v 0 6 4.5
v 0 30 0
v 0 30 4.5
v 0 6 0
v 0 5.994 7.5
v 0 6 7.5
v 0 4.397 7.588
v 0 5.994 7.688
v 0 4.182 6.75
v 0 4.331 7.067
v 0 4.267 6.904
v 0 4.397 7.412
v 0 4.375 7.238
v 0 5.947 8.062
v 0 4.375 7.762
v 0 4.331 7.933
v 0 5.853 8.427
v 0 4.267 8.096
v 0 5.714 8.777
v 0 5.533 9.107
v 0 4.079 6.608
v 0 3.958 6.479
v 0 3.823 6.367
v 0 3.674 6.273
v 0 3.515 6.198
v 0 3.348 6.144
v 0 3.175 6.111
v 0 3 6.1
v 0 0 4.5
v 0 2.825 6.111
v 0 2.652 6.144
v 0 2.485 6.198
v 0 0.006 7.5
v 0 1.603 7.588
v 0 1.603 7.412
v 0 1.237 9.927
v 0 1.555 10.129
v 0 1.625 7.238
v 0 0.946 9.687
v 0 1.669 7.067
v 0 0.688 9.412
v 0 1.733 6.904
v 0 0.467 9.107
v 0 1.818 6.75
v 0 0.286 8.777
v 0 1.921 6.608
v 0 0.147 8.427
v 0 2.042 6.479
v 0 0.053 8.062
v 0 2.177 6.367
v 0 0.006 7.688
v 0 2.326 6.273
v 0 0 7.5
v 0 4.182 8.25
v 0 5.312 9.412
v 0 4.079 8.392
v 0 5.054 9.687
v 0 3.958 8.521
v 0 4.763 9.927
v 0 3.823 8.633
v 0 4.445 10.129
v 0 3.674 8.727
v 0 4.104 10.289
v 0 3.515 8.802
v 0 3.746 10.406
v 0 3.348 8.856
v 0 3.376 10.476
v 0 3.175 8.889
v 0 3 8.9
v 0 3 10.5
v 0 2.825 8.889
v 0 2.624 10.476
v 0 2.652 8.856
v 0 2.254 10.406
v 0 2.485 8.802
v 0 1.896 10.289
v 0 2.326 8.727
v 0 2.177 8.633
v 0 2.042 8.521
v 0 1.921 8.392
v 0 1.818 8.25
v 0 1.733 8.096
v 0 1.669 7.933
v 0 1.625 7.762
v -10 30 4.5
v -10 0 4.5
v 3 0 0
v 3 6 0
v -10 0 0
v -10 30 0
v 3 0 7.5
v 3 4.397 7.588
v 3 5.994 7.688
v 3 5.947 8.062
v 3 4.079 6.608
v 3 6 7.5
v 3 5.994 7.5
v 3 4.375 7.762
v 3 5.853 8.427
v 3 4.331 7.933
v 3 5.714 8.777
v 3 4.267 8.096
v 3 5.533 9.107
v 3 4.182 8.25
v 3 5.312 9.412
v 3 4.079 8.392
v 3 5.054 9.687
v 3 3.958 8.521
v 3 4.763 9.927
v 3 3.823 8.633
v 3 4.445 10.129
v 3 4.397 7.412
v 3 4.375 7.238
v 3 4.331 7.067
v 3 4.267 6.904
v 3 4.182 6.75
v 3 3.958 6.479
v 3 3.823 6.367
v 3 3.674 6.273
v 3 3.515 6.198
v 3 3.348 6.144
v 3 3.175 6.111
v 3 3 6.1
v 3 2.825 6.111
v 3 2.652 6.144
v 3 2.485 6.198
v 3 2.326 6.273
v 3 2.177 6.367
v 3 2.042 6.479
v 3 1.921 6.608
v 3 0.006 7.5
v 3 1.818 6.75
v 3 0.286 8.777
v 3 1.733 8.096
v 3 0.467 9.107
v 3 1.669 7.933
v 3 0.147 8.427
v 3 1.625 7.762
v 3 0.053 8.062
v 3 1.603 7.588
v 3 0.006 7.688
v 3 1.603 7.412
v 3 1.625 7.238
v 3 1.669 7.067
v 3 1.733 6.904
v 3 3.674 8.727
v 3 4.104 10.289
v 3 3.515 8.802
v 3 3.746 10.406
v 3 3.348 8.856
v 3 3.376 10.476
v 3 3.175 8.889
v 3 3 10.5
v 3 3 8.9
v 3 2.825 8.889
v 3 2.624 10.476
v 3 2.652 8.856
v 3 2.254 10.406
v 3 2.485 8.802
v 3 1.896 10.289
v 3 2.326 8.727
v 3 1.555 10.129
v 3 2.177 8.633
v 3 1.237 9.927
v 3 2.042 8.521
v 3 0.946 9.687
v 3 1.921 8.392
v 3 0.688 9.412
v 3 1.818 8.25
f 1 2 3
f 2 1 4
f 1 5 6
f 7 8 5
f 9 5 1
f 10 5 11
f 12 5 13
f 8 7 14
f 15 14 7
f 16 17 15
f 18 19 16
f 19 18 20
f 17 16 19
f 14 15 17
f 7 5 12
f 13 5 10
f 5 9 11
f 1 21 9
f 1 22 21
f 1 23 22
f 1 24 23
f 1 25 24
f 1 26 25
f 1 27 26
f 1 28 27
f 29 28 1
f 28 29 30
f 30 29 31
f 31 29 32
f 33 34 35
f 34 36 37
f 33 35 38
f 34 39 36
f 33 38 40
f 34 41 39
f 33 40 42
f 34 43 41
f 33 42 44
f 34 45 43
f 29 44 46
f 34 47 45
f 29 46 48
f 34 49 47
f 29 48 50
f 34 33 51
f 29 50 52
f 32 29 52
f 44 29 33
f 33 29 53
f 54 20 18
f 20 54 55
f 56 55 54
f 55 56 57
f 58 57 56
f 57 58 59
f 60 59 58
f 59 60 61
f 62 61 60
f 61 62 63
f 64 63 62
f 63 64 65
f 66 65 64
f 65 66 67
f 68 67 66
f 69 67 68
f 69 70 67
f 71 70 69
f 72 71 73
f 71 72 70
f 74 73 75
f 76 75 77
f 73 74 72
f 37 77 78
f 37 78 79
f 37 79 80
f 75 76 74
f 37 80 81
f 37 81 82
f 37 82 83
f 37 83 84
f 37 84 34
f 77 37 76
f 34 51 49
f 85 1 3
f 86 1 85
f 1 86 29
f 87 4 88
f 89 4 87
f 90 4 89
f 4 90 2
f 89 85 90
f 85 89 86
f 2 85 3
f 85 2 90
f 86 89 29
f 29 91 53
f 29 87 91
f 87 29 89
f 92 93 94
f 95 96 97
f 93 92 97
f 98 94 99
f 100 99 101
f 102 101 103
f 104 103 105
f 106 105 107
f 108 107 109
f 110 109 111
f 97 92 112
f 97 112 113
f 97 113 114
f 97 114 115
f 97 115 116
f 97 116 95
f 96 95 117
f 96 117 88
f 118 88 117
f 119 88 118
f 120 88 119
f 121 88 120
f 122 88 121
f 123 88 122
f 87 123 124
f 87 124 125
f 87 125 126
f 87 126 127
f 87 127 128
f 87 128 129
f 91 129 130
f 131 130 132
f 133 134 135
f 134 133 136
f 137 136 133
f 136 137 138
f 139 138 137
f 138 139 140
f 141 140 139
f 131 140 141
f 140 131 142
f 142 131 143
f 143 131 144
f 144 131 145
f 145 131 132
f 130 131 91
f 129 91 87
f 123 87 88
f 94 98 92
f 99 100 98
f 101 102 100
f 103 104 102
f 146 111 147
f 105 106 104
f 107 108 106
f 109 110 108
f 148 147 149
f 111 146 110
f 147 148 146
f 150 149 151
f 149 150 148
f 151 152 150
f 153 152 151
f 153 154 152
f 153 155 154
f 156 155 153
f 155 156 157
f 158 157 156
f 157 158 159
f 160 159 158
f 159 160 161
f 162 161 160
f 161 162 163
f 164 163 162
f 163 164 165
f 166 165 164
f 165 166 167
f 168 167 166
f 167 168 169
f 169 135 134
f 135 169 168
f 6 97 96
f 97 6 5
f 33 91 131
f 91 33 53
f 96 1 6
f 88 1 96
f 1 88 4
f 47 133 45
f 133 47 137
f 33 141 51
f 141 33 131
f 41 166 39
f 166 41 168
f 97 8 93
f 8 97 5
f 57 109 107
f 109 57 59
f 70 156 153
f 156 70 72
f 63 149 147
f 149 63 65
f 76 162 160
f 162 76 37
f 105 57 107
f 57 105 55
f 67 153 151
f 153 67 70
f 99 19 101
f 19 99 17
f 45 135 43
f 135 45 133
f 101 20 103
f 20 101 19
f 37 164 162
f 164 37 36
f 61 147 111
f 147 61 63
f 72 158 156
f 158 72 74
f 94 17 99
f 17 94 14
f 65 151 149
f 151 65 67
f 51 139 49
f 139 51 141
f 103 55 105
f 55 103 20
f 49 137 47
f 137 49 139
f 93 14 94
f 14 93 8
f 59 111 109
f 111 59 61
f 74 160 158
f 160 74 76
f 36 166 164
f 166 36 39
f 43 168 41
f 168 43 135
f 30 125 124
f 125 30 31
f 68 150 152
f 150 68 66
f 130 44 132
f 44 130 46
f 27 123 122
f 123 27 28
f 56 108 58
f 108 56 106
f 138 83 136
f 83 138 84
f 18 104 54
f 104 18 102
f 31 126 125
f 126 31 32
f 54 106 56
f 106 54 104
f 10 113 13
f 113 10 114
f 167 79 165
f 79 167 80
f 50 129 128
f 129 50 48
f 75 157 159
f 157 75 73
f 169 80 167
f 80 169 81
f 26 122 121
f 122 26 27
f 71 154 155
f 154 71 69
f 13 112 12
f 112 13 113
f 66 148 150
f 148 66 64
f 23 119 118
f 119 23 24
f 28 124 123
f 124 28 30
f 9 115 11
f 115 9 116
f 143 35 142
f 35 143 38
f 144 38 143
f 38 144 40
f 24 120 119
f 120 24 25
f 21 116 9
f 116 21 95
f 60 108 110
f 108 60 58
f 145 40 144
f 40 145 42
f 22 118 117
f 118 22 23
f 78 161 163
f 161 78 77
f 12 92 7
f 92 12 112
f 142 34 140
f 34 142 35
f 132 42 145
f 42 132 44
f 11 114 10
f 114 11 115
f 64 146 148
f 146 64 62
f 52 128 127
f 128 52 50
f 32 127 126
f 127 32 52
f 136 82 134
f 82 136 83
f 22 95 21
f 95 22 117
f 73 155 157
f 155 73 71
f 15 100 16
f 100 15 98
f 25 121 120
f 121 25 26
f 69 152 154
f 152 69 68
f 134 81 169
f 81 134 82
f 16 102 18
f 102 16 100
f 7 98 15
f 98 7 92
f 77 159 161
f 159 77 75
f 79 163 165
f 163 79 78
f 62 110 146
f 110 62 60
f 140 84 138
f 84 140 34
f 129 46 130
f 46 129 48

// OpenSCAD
$fn = 50;

thickness = 4.5;

difference() {
    union() {
        translate([-10, 0, 0]) cube([10, 30, thickness]);
        cube([3, 6, 3 + thickness]);
        translate([0, 3, 3 + thickness]) rotate([0, 90, 0]) cylinder(r = 3, h = 3);
    }
    translate([0, 3, 3 + thickness]) 
        rotate([0, 90, 0]) 
            cylinder(d = 2.8, h = 20, center = true);
}
